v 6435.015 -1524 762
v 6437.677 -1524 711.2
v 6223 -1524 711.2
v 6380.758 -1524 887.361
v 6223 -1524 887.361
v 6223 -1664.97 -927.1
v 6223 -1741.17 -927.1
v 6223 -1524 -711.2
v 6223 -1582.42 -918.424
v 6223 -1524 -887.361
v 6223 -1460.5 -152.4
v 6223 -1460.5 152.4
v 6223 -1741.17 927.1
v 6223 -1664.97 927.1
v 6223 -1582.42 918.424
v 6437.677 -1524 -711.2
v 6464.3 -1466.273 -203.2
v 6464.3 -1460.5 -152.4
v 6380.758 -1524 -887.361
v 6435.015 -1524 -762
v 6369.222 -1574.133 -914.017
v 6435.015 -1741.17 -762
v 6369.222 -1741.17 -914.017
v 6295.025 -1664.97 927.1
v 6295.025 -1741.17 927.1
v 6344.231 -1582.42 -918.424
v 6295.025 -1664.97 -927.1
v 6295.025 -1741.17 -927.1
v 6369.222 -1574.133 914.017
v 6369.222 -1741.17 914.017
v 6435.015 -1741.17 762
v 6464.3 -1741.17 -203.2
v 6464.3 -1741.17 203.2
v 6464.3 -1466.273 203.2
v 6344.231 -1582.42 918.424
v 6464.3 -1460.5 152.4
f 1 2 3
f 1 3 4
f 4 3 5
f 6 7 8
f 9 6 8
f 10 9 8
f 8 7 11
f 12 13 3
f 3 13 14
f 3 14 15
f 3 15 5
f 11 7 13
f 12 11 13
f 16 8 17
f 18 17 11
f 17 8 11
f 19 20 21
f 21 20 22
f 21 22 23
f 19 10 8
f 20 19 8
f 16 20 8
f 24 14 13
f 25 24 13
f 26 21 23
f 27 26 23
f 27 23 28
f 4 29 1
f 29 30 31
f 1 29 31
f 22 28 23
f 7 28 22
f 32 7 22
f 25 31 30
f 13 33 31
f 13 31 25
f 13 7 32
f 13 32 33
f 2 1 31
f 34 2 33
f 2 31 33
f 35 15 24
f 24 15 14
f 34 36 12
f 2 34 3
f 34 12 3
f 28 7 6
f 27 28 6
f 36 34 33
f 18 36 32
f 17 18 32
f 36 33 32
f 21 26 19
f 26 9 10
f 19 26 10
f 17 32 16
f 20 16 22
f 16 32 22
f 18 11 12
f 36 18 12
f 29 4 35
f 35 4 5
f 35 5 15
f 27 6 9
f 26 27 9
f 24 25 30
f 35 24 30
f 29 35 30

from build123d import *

# Parameters (mm, degrees)
F0_W     = 304.8
F0_H     = 355.6
F1_DEPTH = 952.5
F3_DEPTH = 355.601
F4_W     = 575.44121
F4_H     = 4171.496656
F5_DEPTH = 241.301
F7_DEPTH = 241.301
F9_DEPTH = 241.301


with BuildPart() as f1:
    # F0 (on Top) → F1 (new body, symmetric)
    with BuildSketch(Plane.XY):
        with Locations((6375.4, -1600.2)):
            Rectangle(F0_W, F0_H)
    extrude(amount=F1_DEPTH, both=True)

    # F2 (on face) → F3 (cut, through all)
    with BuildSketch(Plane.XZ.offset(1778)):
        Polygon((6369.221802, 914.017151), (6435.014533, 762), (6464.3, 203.2), (6464.3, 0), (6464.3, -203.2), (6435.014533, -762), (6369.221802, -914.017151), (6223, -939.8), (6223, -1333.5), (8458.2, -1333.5), (8458.2, 1333.5), (6223, 1333.5), (6223, 939.8), align=None)
    extrude(amount=-F3_DEPTH, mode=Mode.SUBTRACT)

    # F4 (on face) → F5 (cut, through all)
    with BuildSketch(Plane(origin=(6223, 0, 0), x_dir=(0, -1, 0), z_dir=(-1, 0, 0))):
        with Locations((2028.890605, 152.959056)):
            Rectangle(F4_W, F4_H)
    extrude(amount=-F5_DEPTH, mode=Mode.SUBTRACT)

    # F6 (on face) → F7 (cut, through all)
    with BuildSketch(Plane(origin=(6223, 0, 0), x_dir=(0, -1, 0), z_dir=(-1, 0, 0))):
        Polygon((1422.4, -939.8), (1422.4, 0), (1422.4, 939.8), (1524, 939.8), (1524, 1382.621926), (624.785322, 1382.621926), (624.785322, -1382.621926), (1524, -1382.621926), (1524, -939.8), align=None)
        Polygon((1460.5, -152.4), (1460.5, 0), (1422.4, 0), (1422.4, -939.8), (1524, -939.8), (1524, -711.2), align=None)
        Polygon((1422.4, 0), (1460.5, 0), (1460.5, 152.4), (1524, 711.2), (1524, 939.8), (1422.4, 939.8), align=None)
    extrude(amount=-F7_DEPTH, mode=Mode.SUBTRACT)

    # F8 (on face) → F9 (cut, through all)
    with BuildSketch(Plane(origin=(6223, 0, 0), x_dir=(0, -1, 0), z_dir=(-1, 0, 0))):
        Polygon((1753.895535, 1074.559246), (1407.100362, 1074.559246), (1407.100362, 825.20454), (1582.42, 918.423645), (1664.97, 927.1), (1753.895535, 927.1), align=None)
        Polygon((1753.895535, -1074.559246), (1753.895535, -927.1), (1664.97, -927.1), (1582.42, -918.423645), (1407.100362, -825.20454), (1407.100362, -1074.559246), align=None)
    extrude(amount=-F9_DEPTH, mode=Mode.SUBTRACT)


solid = f1.part
